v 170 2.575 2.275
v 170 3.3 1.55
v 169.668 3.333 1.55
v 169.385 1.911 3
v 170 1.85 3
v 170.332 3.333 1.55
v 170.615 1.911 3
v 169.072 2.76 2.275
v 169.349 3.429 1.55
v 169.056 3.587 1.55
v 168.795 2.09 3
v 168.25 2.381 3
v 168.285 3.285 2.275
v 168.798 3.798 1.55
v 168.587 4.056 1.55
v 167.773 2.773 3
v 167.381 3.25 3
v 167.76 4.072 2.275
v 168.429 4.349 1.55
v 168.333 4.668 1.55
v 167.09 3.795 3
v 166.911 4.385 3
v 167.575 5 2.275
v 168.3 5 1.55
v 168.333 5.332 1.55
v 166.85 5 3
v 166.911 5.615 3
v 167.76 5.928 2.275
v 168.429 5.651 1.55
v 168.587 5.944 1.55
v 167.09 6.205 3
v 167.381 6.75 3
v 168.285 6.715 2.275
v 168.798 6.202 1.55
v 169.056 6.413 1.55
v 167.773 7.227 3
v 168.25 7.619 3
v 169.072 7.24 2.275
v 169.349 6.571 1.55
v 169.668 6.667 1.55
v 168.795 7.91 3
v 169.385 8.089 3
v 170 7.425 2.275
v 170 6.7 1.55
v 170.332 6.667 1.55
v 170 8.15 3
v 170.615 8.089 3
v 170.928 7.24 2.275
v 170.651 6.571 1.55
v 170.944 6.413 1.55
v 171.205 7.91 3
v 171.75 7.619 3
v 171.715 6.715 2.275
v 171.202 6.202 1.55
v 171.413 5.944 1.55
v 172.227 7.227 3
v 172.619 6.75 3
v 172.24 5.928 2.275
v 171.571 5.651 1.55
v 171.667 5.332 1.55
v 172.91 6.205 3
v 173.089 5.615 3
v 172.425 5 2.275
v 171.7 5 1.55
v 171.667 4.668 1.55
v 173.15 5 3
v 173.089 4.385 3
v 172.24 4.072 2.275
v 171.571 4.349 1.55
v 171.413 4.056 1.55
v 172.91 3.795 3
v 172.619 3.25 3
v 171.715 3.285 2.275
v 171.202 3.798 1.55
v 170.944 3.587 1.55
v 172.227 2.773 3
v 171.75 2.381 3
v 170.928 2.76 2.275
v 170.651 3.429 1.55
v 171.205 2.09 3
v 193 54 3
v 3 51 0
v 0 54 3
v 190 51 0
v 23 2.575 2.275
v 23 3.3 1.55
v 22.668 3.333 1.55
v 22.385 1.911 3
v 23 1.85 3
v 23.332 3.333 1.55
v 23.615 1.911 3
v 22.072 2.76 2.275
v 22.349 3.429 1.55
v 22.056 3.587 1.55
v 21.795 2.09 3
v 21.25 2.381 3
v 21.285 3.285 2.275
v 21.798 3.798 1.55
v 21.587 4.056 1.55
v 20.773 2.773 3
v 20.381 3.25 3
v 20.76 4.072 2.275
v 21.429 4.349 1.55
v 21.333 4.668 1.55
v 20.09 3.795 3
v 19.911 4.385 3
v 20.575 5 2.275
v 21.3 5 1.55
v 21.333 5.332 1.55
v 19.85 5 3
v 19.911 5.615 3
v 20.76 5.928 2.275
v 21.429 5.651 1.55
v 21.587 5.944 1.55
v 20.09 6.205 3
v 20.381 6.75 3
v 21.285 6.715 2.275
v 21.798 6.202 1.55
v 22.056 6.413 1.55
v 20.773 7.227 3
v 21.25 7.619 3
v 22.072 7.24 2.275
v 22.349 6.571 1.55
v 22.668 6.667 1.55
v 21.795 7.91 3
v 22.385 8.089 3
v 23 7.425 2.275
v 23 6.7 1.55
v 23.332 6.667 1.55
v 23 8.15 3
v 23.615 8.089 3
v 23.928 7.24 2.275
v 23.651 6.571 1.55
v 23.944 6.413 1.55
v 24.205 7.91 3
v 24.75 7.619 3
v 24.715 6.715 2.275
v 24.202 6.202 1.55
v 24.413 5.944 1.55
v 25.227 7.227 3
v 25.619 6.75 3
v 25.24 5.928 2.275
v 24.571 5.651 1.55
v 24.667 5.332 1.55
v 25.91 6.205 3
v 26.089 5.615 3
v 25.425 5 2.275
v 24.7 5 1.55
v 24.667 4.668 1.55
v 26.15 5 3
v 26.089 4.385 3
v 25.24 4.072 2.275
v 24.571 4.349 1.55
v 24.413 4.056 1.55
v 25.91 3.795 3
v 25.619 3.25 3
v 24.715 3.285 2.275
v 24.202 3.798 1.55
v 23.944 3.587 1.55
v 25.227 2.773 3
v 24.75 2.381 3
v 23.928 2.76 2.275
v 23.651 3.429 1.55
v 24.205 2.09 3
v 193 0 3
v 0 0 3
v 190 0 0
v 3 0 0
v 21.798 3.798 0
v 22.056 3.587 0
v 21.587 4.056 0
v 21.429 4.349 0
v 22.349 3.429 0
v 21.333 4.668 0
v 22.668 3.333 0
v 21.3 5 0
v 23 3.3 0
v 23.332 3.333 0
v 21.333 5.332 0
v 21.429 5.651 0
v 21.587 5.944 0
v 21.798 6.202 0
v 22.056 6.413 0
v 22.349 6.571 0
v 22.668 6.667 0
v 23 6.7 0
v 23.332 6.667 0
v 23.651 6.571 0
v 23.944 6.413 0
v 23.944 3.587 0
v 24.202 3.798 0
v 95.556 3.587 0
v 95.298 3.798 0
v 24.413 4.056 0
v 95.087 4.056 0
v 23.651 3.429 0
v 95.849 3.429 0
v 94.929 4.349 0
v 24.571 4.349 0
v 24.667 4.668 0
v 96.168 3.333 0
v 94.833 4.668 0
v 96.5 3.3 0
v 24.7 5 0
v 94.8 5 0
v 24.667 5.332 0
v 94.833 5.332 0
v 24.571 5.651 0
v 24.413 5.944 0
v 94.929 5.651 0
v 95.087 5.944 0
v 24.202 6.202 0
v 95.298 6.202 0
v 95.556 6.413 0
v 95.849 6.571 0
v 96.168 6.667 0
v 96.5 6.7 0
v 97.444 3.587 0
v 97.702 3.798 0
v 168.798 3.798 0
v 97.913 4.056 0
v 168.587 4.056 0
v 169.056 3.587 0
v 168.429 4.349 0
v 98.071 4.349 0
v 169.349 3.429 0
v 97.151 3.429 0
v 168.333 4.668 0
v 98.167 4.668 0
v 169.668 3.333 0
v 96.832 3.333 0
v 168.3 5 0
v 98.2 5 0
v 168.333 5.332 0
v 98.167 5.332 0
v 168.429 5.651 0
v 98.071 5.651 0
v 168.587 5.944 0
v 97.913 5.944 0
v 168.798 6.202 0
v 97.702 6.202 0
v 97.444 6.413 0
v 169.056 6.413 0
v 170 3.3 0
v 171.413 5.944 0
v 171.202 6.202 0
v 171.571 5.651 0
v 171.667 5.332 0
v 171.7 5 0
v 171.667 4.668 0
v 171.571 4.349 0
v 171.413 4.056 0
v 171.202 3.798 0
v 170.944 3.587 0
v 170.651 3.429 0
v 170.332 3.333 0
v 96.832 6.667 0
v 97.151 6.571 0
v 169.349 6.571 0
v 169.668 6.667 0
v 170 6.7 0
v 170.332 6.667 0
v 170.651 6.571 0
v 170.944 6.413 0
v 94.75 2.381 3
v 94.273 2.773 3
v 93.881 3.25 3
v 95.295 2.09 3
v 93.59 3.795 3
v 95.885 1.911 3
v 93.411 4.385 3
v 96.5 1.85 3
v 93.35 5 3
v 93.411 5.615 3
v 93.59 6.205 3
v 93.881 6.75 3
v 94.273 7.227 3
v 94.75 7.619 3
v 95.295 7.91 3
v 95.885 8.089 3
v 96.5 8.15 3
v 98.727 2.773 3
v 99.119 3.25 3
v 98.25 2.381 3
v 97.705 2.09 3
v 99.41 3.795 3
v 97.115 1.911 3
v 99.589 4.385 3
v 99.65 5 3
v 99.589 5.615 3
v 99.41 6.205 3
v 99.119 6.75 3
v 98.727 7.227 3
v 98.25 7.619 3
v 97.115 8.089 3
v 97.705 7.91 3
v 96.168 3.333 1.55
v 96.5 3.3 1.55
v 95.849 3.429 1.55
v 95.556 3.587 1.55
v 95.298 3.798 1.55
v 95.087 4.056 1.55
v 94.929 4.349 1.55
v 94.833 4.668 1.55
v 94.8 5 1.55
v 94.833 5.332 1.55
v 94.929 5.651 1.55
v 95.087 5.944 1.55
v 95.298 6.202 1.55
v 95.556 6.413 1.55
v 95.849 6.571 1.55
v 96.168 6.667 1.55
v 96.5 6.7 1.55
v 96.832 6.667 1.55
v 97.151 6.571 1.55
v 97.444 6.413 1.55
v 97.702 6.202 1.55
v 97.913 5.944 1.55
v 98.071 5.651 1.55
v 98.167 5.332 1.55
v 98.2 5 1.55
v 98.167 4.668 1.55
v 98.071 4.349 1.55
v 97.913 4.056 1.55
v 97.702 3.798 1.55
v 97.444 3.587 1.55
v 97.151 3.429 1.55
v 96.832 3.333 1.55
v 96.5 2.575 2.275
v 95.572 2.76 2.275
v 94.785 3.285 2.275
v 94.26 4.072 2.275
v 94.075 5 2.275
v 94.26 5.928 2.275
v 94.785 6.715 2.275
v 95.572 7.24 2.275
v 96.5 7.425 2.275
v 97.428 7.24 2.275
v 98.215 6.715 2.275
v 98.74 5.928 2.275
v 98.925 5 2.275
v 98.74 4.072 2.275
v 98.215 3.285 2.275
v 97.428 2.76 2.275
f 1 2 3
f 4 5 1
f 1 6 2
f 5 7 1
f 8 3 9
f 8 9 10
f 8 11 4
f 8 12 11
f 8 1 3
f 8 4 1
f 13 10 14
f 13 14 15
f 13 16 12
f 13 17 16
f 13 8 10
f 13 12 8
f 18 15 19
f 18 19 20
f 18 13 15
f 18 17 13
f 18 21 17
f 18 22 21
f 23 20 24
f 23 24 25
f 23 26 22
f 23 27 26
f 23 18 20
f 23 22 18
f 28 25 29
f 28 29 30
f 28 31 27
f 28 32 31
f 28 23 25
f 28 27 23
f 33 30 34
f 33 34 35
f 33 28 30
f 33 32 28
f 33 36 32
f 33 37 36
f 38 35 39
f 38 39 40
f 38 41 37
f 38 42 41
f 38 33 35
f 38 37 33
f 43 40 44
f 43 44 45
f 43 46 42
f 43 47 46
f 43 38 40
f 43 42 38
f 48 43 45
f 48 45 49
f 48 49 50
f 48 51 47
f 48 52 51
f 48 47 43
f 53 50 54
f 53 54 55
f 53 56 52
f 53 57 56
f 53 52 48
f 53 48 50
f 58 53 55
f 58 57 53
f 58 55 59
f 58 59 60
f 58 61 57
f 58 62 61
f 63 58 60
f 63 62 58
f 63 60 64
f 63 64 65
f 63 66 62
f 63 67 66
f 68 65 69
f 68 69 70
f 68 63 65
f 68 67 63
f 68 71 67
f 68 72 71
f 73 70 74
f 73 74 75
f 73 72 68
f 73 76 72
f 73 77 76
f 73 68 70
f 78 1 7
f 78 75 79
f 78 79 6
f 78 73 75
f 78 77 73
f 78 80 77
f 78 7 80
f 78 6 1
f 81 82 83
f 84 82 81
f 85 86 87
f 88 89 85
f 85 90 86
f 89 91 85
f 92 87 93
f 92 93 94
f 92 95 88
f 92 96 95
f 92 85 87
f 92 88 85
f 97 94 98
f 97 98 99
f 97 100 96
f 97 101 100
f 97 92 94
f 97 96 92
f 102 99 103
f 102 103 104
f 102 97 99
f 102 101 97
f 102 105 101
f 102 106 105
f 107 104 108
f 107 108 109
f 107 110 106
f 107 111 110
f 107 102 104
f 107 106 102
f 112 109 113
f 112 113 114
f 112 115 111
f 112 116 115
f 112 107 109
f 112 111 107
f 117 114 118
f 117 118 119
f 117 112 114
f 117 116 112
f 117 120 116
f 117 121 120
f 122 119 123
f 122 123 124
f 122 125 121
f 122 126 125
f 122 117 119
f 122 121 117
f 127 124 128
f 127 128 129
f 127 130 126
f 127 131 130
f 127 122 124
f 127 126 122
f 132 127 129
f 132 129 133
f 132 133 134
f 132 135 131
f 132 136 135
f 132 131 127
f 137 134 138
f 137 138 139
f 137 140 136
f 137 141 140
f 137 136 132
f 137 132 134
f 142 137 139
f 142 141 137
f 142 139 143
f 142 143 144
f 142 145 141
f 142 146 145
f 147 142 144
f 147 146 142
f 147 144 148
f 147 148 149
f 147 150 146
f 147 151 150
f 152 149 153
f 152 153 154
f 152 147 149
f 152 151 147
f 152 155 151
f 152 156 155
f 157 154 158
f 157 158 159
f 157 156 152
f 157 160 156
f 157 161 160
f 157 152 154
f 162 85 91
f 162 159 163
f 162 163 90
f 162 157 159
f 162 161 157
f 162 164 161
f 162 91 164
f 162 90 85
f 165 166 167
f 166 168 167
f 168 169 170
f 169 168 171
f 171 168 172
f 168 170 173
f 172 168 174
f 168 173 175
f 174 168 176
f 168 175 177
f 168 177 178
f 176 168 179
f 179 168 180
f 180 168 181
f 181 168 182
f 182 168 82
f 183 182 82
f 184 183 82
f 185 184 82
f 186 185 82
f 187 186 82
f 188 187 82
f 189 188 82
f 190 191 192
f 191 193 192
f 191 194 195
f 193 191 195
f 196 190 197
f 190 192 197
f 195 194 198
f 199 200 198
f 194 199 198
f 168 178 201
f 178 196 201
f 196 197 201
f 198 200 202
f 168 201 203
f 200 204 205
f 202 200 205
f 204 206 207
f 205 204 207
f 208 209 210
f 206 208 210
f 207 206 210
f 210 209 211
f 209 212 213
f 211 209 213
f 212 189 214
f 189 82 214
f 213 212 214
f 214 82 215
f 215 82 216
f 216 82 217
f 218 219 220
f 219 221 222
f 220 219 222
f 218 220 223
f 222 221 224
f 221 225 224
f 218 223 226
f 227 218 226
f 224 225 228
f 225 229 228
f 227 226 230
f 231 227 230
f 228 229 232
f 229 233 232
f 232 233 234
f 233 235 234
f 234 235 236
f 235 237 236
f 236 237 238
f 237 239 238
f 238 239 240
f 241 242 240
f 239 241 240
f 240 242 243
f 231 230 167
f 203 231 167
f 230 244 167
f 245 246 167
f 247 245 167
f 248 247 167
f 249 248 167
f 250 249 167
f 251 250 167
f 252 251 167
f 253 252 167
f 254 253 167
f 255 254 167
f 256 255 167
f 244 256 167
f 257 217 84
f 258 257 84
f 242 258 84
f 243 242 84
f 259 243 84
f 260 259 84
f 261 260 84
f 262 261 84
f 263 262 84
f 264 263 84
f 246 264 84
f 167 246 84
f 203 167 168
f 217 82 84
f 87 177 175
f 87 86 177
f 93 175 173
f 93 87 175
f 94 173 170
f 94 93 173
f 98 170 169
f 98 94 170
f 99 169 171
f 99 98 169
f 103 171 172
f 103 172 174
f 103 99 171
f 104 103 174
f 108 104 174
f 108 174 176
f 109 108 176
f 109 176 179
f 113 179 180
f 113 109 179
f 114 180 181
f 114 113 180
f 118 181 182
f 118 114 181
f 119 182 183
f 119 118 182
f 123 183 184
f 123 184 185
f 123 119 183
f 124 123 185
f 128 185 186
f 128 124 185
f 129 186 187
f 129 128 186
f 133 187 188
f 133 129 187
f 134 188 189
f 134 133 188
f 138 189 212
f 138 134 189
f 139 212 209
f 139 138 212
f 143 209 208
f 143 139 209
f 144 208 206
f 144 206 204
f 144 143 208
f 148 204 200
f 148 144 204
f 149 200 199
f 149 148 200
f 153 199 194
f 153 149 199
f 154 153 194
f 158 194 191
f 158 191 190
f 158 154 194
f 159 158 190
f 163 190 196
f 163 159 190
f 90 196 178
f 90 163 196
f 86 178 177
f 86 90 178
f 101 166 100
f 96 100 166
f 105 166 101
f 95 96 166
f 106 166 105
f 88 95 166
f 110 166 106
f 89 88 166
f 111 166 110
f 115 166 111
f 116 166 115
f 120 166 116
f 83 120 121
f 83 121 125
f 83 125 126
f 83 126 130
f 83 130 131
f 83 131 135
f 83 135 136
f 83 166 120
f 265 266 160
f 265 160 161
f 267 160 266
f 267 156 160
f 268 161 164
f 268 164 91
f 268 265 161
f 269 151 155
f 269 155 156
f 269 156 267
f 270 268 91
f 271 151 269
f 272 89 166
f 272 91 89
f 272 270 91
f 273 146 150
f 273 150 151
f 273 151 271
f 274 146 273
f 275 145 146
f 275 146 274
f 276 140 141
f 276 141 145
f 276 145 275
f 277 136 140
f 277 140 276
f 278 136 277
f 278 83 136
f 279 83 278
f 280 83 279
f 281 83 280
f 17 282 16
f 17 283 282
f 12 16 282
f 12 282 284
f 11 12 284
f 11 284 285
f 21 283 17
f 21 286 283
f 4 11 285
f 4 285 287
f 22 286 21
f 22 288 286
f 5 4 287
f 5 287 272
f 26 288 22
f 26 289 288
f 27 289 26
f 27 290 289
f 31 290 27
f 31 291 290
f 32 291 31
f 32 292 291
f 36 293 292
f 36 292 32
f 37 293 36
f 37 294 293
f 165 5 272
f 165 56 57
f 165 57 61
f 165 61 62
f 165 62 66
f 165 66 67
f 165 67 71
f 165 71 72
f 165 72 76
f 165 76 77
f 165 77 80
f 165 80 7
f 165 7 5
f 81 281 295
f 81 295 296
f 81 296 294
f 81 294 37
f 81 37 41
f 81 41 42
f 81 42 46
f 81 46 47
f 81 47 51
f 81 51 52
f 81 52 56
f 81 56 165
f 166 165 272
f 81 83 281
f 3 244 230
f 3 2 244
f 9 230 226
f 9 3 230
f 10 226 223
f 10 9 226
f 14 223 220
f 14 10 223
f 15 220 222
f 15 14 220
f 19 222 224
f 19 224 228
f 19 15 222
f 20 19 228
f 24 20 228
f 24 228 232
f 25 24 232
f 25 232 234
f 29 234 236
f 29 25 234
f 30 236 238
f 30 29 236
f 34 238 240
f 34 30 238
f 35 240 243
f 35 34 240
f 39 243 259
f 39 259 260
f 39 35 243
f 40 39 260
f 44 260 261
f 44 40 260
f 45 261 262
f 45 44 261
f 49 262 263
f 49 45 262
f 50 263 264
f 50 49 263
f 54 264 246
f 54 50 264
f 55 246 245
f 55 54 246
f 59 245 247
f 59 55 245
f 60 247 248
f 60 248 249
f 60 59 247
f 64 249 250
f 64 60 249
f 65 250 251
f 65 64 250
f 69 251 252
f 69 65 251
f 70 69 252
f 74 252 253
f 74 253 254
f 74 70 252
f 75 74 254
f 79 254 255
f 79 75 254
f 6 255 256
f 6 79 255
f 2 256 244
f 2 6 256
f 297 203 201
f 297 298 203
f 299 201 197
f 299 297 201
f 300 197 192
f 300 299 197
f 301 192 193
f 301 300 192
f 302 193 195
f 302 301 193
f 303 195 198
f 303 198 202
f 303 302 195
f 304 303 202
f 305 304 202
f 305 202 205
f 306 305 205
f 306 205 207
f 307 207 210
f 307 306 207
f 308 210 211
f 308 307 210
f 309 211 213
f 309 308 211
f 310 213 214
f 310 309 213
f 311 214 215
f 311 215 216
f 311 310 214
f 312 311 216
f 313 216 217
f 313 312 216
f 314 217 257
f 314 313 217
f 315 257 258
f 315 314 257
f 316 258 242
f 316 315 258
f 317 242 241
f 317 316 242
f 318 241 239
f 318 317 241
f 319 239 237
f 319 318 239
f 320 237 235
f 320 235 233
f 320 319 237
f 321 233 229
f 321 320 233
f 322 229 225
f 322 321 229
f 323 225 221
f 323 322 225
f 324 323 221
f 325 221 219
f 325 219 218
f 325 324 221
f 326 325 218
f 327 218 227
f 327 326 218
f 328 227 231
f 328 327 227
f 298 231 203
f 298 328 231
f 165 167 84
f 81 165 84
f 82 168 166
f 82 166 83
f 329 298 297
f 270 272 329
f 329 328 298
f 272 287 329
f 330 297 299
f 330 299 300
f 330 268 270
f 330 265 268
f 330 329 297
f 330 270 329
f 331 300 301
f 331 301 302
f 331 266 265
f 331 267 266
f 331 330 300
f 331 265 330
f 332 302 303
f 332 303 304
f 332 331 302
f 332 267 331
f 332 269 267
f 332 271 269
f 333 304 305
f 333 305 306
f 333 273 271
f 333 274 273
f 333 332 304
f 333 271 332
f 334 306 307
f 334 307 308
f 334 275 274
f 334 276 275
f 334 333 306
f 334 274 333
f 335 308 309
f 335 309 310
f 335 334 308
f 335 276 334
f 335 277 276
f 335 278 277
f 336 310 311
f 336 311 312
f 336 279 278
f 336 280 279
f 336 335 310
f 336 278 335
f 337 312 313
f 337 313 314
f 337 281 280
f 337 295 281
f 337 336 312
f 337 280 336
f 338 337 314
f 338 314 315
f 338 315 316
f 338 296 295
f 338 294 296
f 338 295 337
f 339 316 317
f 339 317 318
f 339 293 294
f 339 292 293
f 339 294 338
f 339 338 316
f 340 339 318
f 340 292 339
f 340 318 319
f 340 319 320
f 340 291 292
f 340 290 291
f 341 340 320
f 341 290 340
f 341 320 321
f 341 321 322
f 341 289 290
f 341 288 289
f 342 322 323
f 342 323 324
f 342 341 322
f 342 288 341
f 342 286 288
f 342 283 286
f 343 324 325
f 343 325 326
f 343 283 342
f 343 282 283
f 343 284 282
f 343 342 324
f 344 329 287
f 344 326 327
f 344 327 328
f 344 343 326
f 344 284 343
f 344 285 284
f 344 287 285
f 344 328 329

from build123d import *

# Parameters (mm, degrees)
SKETCH1_W                                      = 193
SKETCH1_H                                      = 54
BOSS_EXTRUDE1_DEPTH                            = 3
CHAMFER1_SIZE                                  = 3
CSK_FOR_M3_FLAT_HEAD_MACHINE_SCREW1_AT_2_COUNT = 2
CSK_FOR_M3_FLAT_HEAD_MACHINE_SCREW1_AT_2_PITCH = 73.5
CSK_FOR_M3_FLAT_HEAD_MACHINE_SCREW1_AT_3_COUNT = 2
CSK_FOR_M3_FLAT_HEAD_MACHINE_SCREW1_AT_3_PITCH = 147


with BuildPart() as part:
    # Sketch1 → Boss-Extrude1 (new body)
    with BuildSketch(Plane.XY):
        with Locations((96.5, 27)):
            Rectangle(SKETCH1_W, SKETCH1_H)
    extrude(amount=BOSS_EXTRUDE1_DEPTH)

    # Chamfer1
    chamfer1_edges = [part.edges().sort_by_distance(p)[0] for p in [
        (0, 27, 0),
        (96.5, 54, 0),
        (193, 27, 0),
    ]]
    chamfer(chamfer1_edges, length=CHAMFER1_SIZE - 0.0001)  # a hair under: the kernel refuses the full size

    # Sketch3 → CSK for M3 Flat Head Machine Screw1 (revolve, cut)
    with BuildSketch(Plane(origin=(23, 5, 3), x_dir=(0, -1, 0), z_dir=(1, 0, 0))):
        Polygon((0, 0), (0, 3), (1.7, 3), (1.7, 1.45), (3.15, 0), align=None)
    csk_for_m3_flat_head_machine_screw1 = revolve(axis=Axis((23, 5, 9.35), (0, 0, -1)), mode=Mode.SUBTRACT)

    # CSK for M3 Flat Head Machine Screw1 at 2: CSK for M3 Flat Head Machine Screw1 ×2
    with Locations(*[(i * CSK_FOR_M3_FLAT_HEAD_MACHINE_SCREW1_AT_2_PITCH, 0, 0) for i in range(1, CSK_FOR_M3_FLAT_HEAD_MACHINE_SCREW1_AT_2_COUNT)]):
        add(csk_for_m3_flat_head_machine_screw1, mode=Mode.SUBTRACT)

    # CSK for M3 Flat Head Machine Screw1 at 3: CSK for M3 Flat Head Machine Screw1 ×2
    with Locations(*[(i * CSK_FOR_M3_FLAT_HEAD_MACHINE_SCREW1_AT_3_PITCH, 0, 0) for i in range(1, CSK_FOR_M3_FLAT_HEAD_MACHINE_SCREW1_AT_3_COUNT)]):
        add(csk_for_m3_flat_head_machine_screw1, mode=Mode.SUBTRACT)


solid = part.part
